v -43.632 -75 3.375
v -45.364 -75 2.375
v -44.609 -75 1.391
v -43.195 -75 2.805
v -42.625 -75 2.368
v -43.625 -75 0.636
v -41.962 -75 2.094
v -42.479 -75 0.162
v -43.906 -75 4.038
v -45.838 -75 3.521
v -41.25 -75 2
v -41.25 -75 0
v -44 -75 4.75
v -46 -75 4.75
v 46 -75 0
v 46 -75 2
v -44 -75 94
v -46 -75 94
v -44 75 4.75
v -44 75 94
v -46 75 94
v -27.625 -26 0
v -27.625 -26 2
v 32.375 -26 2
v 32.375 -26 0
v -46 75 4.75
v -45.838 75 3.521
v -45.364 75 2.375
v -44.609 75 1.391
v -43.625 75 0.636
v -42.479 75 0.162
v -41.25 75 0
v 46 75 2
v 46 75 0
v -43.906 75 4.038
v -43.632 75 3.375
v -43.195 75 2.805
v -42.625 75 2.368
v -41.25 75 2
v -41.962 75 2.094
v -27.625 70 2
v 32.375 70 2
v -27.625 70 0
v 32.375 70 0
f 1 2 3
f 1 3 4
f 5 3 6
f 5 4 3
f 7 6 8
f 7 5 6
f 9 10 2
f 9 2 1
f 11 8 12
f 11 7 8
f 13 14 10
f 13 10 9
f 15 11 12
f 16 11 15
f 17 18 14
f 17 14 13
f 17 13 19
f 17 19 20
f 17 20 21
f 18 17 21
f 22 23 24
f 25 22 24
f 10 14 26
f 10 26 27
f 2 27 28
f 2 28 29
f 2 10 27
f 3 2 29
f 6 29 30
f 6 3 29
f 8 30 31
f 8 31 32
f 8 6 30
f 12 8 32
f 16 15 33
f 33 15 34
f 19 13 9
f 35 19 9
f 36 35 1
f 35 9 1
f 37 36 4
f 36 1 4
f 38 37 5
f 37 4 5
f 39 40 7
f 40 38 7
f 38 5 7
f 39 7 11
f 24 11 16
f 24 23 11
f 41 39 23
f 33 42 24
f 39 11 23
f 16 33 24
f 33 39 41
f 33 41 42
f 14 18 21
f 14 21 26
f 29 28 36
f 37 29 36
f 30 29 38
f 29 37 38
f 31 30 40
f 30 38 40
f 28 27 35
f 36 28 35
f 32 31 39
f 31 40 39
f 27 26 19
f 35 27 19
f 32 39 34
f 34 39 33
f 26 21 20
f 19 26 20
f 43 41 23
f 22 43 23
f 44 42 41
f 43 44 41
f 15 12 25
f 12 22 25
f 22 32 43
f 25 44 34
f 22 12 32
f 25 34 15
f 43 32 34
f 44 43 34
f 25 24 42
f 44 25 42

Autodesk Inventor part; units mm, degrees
ref_plane "YZ Plane" through (0, 0, 0) normal (1, 0, 0) x (0, 1, 0)
ref_plane "XZ Plane" through (0, 0, 0) normal (0, 1, 0) x (-1, 0, 0)
ref_plane "XY Plane" through (0, 0, 0) normal (0, 0, 1) x (1, 0, 0)
sketch "Sketch1" plane through (0, 0, 0) normal (0, 0, 1) x (1, 0, 0)
  line L0 (-46, -75) -> (46, -75)
  line L1 (46, -75) -> (46, 75)
  line L2 (46, 75) -> (-46, 75)
  line L3 (-46, 75) -> (-46, -75)
  line L4 (-46, -75) -> (46, 75) construction
  line L5 (46, -75) -> (-46, 75) construction
  point P0 (0, 0)
  dimension "d154" = 92
  dimension "d155" = 150
extrude "Plate5" add sketch "Sketch1" along normal blind 2
sketch "Sketch7" plane through (-44, -75, 0) normal (-1, 0, 0) x (0, -1, 0)
  line L0 (-150, 0) -> (0, 0)
  line L1 (0, 0) -> (0, 94)
  line L2 (0, 94) -> (-150, 94)
  line L3 (-150, 94) -> (-150, 0)
edge flange "Flange3" height 94 angle 90 thickness 2 bend radius 2.75 thickness toward (-1, 0, 0) relief round relief width 2 relief depth 1 edges at (-46, 0, 2) wall of the first edge with corners at (-44, 75, 0) (-44, -75, 0) (-44, -75, 94) (-44, 75, 94)
bend "Bend3"
corner "Corner3"
sketch "Sketch8" plane through (0, 0, 2) normal (0, 0, 1) x (1, 0, 0)
  line L0 (46, 75) -> (46, -75) projected
  line L1 (-41.25, 75) -> (46, 75) projected
  line L2 (32.375, 70) -> (-27.625, 70)
  line L3 (-27.625, 70) -> (-27.625, -26)
  line L4 (-27.625, -26) -> (32.375, -26)
  line L5 (32.375, -26) -> (32.375, 70)
  line L6 (32.375, 70) -> (-27.625, -26) construction
  line L7 (-27.625, 70) -> (32.375, -26) construction
  point P0 (0, 0)
  point P1 (2.375, 22)
  point P2 (2.375, 75)
  dimension "d167" = 60
  dimension "d168" = 96
  dimension "d169" = 5
extrude "Cut1" cut sketch "Sketch8" against normal blind 2
properties part number "PNS 1652 FDS Central tube wall" material "Stainless Steel"
